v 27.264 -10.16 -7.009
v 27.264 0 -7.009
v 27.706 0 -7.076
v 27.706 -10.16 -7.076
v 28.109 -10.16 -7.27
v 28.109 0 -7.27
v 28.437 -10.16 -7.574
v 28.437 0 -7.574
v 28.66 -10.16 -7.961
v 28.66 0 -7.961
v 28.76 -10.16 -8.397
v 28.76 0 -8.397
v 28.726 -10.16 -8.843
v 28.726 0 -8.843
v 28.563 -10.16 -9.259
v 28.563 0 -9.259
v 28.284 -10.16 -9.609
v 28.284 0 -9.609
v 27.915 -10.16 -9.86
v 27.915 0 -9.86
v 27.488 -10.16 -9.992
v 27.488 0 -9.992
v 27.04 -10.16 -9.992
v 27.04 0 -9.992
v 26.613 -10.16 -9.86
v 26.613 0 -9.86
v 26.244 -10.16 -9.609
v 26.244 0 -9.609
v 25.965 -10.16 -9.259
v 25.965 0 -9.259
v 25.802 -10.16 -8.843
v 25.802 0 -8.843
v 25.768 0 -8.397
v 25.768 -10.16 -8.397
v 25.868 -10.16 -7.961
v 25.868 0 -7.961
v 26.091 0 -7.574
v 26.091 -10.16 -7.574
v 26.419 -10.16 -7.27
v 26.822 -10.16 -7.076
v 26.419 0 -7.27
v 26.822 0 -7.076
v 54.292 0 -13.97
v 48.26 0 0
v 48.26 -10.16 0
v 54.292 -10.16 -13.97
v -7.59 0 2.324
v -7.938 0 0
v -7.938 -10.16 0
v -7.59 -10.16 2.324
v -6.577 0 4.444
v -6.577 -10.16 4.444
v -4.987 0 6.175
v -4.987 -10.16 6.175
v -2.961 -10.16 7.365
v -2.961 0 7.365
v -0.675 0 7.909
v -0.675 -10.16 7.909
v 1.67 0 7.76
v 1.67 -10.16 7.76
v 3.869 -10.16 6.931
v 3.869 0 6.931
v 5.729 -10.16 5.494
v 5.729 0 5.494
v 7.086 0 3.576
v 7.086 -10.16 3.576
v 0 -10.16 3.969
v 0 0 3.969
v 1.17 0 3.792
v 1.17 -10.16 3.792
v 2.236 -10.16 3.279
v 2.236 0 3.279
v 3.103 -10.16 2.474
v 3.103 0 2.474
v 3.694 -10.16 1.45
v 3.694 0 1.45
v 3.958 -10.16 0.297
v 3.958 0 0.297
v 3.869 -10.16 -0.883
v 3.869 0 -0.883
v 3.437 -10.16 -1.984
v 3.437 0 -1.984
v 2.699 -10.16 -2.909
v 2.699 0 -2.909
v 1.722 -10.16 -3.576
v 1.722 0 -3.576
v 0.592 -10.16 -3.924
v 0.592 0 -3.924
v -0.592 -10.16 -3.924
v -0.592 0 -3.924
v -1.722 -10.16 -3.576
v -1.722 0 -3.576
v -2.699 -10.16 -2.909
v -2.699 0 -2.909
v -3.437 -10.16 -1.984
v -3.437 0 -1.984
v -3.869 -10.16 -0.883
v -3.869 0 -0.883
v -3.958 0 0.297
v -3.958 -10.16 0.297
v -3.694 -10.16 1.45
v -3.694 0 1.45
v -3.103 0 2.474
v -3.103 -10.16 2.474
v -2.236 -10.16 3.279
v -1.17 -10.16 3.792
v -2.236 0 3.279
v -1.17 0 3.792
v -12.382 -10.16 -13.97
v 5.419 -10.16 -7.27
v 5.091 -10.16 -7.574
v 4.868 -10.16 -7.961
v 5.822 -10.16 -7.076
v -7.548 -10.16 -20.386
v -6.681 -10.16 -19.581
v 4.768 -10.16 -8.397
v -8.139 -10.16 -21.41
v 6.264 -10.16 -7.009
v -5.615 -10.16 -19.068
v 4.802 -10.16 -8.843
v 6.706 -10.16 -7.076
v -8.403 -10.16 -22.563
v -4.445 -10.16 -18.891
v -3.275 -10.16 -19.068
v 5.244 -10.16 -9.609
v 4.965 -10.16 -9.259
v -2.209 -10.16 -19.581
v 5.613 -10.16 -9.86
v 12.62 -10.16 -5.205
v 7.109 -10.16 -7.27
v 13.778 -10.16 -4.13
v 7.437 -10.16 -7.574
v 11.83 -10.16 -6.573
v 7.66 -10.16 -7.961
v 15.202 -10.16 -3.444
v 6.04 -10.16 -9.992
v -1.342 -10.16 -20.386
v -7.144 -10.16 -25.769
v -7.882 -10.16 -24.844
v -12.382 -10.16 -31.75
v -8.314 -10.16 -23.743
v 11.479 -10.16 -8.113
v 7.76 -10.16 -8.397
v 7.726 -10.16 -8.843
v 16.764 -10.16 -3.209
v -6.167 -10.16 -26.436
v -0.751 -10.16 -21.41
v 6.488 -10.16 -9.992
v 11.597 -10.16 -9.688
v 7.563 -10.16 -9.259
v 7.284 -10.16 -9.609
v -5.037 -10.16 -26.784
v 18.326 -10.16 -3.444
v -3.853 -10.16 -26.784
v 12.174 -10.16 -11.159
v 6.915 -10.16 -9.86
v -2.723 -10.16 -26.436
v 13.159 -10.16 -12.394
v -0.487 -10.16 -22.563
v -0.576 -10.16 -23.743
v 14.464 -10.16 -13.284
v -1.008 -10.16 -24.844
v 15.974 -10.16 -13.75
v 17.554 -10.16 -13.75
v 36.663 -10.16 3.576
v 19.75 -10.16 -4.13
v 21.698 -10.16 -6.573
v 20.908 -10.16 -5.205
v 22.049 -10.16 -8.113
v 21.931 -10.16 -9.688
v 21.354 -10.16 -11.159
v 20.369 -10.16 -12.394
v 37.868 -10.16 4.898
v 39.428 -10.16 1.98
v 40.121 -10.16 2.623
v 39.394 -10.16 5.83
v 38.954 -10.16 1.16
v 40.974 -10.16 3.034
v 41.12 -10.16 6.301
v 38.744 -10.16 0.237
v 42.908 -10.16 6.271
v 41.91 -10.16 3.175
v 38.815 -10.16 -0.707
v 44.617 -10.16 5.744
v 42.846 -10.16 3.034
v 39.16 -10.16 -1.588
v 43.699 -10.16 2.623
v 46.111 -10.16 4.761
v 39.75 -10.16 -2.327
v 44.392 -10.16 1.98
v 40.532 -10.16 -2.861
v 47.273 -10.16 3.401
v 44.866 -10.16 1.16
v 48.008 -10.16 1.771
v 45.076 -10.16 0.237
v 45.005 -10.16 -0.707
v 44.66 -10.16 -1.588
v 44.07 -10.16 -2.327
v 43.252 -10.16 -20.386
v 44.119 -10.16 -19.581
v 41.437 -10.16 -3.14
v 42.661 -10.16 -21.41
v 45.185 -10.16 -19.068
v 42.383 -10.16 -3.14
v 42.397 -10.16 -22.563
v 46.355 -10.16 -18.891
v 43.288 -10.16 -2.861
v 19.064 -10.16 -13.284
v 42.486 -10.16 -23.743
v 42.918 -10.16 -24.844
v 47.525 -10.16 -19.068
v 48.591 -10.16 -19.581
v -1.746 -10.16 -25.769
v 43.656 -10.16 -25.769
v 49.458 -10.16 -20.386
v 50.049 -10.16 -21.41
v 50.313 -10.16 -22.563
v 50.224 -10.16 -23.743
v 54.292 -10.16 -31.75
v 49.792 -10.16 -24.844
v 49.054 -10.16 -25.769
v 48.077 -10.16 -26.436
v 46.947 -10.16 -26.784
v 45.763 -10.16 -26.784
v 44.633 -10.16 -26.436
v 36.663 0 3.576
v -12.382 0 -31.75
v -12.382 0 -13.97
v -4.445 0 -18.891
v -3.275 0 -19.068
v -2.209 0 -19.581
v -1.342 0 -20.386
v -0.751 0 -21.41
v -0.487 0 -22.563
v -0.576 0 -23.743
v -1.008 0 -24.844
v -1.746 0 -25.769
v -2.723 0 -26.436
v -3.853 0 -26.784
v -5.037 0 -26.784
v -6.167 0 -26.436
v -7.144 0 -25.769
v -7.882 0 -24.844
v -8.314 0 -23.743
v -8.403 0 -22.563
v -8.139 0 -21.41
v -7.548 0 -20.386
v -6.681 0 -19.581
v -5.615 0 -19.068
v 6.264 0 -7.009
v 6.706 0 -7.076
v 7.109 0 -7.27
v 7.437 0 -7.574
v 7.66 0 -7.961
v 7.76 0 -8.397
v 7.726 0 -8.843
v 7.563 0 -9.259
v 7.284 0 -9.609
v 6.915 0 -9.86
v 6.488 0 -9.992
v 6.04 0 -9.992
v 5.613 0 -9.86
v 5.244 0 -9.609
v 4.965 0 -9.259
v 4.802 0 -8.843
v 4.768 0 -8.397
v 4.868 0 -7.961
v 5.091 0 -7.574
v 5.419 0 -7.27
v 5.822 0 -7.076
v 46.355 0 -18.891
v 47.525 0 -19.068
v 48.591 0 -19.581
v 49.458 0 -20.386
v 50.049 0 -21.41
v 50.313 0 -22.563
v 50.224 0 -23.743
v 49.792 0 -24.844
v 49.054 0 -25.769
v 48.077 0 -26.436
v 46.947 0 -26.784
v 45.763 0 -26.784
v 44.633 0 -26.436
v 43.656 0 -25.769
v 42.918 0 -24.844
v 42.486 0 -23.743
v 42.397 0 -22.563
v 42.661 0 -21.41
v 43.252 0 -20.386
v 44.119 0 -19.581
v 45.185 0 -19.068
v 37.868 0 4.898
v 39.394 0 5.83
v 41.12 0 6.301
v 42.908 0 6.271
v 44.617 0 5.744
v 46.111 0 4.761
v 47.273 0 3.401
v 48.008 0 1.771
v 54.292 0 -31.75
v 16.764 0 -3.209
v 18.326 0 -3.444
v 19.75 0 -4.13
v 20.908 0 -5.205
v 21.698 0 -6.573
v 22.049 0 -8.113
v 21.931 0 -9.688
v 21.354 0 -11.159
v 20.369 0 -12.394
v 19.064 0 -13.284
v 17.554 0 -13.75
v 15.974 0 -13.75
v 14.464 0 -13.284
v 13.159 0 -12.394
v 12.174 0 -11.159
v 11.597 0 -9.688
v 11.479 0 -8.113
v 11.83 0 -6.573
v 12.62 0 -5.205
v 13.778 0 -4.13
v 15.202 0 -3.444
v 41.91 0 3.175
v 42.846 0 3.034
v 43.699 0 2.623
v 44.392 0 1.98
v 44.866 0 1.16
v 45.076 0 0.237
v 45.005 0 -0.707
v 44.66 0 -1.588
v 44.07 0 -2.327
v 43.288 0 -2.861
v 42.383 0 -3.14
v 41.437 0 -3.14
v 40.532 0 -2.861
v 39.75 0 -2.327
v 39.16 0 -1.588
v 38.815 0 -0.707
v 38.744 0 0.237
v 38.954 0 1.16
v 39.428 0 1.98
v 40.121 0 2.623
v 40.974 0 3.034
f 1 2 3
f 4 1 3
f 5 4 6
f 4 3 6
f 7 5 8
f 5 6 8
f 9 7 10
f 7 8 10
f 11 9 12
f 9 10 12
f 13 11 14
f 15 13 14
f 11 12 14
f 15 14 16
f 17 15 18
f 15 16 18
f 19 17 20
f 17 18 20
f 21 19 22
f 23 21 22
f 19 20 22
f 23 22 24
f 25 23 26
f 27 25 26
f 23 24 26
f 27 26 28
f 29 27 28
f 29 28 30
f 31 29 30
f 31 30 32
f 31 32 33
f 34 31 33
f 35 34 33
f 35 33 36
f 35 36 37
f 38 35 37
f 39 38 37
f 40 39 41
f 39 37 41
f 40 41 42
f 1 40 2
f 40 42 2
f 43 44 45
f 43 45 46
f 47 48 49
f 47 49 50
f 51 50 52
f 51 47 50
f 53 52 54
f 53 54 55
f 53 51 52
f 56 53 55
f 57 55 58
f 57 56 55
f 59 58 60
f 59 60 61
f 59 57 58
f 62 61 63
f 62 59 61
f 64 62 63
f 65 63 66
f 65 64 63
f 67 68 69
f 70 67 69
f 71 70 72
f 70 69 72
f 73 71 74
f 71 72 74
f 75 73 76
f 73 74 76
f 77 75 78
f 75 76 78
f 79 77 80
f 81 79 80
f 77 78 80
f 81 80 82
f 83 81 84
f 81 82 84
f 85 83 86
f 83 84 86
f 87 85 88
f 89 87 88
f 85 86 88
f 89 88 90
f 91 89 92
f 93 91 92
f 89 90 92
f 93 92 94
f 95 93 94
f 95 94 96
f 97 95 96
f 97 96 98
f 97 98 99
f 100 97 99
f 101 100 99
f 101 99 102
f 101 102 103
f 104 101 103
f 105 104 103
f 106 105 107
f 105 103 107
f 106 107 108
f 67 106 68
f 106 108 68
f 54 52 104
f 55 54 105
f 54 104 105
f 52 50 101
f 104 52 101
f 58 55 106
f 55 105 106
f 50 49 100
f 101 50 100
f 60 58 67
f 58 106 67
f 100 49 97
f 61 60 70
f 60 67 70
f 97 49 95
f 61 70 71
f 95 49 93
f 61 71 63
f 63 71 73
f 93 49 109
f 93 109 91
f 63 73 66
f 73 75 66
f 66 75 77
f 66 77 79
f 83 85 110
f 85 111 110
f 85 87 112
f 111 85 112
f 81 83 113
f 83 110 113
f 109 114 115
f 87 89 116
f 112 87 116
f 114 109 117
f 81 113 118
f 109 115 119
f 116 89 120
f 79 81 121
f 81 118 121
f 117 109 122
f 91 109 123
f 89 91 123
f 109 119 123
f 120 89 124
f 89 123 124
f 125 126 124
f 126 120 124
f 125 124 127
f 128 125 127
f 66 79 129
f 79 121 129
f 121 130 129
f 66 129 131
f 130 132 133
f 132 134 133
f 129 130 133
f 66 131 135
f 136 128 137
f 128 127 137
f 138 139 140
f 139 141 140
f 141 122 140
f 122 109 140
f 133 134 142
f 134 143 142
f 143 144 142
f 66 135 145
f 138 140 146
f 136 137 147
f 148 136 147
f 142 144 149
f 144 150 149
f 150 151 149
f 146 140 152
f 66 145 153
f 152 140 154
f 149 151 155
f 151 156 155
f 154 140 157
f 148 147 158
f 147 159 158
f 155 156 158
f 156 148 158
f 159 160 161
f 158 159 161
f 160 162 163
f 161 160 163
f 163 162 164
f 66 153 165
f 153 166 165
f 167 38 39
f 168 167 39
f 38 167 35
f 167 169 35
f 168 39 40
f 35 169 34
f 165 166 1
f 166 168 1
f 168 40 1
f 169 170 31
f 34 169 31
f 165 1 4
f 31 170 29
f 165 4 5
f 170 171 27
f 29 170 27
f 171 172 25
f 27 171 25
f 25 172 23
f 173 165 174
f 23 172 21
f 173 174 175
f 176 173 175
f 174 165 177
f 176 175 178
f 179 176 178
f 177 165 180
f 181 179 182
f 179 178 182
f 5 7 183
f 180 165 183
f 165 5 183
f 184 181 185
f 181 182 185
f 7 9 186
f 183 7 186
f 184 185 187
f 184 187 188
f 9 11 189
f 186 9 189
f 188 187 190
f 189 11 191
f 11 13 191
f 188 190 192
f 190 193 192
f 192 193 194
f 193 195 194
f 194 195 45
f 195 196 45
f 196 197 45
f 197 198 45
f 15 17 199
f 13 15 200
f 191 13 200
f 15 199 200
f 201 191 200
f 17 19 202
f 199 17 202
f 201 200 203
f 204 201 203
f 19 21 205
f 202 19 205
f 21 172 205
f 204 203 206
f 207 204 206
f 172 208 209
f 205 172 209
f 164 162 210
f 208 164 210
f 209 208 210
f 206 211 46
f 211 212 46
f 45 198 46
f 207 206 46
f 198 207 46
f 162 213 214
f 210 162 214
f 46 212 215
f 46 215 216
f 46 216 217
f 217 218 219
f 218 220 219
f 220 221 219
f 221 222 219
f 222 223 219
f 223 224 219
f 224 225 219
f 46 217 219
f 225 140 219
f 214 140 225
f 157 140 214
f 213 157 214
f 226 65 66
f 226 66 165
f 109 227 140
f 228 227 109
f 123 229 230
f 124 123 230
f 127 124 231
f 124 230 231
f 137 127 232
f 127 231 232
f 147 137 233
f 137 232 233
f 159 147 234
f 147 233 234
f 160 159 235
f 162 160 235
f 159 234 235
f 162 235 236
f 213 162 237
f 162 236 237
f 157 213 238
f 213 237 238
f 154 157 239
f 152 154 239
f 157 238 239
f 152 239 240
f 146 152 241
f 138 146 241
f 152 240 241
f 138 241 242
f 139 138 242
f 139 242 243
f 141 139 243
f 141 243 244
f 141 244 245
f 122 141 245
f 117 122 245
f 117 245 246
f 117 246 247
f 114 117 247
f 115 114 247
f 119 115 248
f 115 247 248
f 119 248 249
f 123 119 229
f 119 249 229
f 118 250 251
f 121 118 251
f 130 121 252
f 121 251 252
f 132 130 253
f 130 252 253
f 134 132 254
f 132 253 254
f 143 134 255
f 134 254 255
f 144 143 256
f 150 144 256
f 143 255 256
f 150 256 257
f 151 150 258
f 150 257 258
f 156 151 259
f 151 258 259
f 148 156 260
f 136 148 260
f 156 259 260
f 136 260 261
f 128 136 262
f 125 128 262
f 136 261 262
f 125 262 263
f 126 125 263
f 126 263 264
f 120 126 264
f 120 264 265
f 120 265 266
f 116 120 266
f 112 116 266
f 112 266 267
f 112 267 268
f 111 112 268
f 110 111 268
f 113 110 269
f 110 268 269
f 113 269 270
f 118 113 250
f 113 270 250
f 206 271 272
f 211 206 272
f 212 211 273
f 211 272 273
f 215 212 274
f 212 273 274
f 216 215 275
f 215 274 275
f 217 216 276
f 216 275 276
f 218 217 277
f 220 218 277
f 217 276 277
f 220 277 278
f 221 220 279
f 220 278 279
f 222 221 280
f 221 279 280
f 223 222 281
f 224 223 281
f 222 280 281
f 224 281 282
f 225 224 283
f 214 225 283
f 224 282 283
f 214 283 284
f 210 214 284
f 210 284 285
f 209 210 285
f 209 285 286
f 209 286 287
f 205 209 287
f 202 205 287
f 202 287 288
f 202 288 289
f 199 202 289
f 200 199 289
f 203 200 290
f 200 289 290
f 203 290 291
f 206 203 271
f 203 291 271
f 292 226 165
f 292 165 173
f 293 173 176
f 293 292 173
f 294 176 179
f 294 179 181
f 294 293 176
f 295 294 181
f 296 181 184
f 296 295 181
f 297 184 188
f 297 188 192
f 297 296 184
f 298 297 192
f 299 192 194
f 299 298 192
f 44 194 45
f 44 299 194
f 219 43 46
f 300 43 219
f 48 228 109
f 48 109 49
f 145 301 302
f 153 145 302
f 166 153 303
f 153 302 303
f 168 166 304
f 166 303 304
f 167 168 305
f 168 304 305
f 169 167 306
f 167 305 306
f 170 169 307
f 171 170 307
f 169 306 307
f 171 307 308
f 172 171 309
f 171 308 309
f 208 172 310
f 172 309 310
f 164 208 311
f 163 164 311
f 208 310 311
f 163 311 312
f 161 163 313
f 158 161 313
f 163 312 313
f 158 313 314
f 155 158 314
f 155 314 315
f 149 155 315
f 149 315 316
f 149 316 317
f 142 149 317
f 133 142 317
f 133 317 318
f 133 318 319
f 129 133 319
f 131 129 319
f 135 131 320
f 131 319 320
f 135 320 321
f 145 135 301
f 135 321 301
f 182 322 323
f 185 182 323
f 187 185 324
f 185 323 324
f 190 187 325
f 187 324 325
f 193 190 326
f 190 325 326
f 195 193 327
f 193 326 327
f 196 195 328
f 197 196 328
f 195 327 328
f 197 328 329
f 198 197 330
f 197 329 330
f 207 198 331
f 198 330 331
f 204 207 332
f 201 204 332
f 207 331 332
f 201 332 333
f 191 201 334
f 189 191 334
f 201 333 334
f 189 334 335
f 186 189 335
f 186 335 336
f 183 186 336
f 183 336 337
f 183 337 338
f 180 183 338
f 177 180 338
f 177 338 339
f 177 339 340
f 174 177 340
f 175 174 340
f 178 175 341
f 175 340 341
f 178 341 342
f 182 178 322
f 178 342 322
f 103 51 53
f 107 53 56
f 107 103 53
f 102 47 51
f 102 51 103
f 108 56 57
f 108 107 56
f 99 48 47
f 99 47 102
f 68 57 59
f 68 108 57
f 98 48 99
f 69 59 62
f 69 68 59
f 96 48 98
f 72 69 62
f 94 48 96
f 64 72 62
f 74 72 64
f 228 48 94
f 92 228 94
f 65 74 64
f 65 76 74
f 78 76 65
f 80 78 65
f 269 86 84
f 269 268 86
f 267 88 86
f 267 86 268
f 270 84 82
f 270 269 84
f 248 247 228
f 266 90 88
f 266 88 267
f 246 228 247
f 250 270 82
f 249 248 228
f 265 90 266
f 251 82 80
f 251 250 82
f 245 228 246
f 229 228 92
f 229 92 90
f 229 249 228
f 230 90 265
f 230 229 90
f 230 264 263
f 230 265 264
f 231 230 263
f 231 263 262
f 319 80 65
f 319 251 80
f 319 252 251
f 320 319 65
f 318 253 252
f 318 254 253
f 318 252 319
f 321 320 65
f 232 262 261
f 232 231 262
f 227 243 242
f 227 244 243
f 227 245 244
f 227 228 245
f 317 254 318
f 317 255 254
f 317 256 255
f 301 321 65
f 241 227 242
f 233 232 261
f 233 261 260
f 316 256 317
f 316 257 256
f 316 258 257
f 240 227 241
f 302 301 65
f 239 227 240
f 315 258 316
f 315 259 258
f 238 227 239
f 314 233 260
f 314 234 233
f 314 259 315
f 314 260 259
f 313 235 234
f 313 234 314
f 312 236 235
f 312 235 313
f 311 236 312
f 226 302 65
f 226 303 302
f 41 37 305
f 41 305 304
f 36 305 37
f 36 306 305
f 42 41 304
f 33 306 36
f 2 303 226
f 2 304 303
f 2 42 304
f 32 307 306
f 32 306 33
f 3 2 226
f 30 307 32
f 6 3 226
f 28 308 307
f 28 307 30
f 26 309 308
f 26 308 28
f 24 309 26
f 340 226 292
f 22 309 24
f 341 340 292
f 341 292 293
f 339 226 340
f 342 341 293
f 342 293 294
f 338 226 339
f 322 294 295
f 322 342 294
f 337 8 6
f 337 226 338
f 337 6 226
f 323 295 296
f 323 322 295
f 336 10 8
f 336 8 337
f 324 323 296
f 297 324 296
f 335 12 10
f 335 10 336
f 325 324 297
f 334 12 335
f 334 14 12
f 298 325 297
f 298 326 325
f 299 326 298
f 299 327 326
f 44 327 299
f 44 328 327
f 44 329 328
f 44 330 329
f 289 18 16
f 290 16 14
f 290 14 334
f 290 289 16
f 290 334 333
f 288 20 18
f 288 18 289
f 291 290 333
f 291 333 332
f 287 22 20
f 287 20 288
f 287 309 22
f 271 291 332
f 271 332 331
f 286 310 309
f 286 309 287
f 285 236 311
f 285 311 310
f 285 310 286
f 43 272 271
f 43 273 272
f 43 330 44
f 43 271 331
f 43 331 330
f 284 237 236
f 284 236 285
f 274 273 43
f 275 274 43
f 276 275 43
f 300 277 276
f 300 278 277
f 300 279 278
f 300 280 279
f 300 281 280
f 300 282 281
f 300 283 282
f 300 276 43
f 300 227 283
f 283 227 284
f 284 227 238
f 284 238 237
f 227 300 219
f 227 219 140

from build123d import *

# Parameters (mm, degrees)
SKETCH1_R           = 3.96875
SKETCH1_R_2         = 3.175
SKETCH1_R_3         = 5.3
SKETCH1_R_4         = 1.5
BOSS_EXTRUDE1_DEPTH = 10.16


with BuildPart() as part:
    # Sketch1 → Boss-Extrude1 (new body)
    with BuildSketch(Plane(origin=(0, 0, 0), x_dir=(1, 0, 0), z_dir=(0, 1, 0))):
        with BuildLine():
            Line((54.2925, 31.75), (-12.3825, 31.75))
            Line((-12.3825, 31.75), (-12.3825, 13.97))
            Line((-12.3825, 13.97), (-7.9375, 0))
            ThreePointArc((-7.9375, 0), (-1.838169821, -7.721725064), (7.086131612, -3.576401128))
            Line((7.086131612, -3.576401128), (36.662919386, -3.576401128))
            ThreePointArc((36.662919386, -3.576401128), (43.781301432, -6.068008813), (48.26, 0))
            Line((48.26, 0), (54.2925, 13.97))
            Line((54.2925, 13.97), (54.2925, 31.75))
        make_face()
        with Locations(Location((0, 0, 0), (0, 0, 270))):
            Circle(SKETCH1_R, mode=Mode.SUBTRACT)
        with Locations(Location((41.91, 0, 0), (0, 0, 270))):
            Circle(SKETCH1_R_2, mode=Mode.SUBTRACT)
        with Locations(Location((46.355, 22.86, 0), (0, 0, 270))):
            Circle(SKETCH1_R, mode=Mode.SUBTRACT)
        with Locations(Location((-4.445, 22.86, 0), (0, 0, 270))):
            Circle(SKETCH1_R, mode=Mode.SUBTRACT)
        with Locations(Location((16.764, 8.509, 0), (0, 0, 270))):
            Circle(SKETCH1_R_3, mode=Mode.SUBTRACT)
        with Locations(Location((6.264, 8.509, 0), (0, 0, 270))):
            Circle(SKETCH1_R_4, mode=Mode.SUBTRACT)
        with Locations(Location((27.264, 8.509, 0), (0, 0, 270))):
            Circle(SKETCH1_R_4, mode=Mode.SUBTRACT)
    extrude(amount=-BOSS_EXTRUDE1_DEPTH)


solid = part.part
